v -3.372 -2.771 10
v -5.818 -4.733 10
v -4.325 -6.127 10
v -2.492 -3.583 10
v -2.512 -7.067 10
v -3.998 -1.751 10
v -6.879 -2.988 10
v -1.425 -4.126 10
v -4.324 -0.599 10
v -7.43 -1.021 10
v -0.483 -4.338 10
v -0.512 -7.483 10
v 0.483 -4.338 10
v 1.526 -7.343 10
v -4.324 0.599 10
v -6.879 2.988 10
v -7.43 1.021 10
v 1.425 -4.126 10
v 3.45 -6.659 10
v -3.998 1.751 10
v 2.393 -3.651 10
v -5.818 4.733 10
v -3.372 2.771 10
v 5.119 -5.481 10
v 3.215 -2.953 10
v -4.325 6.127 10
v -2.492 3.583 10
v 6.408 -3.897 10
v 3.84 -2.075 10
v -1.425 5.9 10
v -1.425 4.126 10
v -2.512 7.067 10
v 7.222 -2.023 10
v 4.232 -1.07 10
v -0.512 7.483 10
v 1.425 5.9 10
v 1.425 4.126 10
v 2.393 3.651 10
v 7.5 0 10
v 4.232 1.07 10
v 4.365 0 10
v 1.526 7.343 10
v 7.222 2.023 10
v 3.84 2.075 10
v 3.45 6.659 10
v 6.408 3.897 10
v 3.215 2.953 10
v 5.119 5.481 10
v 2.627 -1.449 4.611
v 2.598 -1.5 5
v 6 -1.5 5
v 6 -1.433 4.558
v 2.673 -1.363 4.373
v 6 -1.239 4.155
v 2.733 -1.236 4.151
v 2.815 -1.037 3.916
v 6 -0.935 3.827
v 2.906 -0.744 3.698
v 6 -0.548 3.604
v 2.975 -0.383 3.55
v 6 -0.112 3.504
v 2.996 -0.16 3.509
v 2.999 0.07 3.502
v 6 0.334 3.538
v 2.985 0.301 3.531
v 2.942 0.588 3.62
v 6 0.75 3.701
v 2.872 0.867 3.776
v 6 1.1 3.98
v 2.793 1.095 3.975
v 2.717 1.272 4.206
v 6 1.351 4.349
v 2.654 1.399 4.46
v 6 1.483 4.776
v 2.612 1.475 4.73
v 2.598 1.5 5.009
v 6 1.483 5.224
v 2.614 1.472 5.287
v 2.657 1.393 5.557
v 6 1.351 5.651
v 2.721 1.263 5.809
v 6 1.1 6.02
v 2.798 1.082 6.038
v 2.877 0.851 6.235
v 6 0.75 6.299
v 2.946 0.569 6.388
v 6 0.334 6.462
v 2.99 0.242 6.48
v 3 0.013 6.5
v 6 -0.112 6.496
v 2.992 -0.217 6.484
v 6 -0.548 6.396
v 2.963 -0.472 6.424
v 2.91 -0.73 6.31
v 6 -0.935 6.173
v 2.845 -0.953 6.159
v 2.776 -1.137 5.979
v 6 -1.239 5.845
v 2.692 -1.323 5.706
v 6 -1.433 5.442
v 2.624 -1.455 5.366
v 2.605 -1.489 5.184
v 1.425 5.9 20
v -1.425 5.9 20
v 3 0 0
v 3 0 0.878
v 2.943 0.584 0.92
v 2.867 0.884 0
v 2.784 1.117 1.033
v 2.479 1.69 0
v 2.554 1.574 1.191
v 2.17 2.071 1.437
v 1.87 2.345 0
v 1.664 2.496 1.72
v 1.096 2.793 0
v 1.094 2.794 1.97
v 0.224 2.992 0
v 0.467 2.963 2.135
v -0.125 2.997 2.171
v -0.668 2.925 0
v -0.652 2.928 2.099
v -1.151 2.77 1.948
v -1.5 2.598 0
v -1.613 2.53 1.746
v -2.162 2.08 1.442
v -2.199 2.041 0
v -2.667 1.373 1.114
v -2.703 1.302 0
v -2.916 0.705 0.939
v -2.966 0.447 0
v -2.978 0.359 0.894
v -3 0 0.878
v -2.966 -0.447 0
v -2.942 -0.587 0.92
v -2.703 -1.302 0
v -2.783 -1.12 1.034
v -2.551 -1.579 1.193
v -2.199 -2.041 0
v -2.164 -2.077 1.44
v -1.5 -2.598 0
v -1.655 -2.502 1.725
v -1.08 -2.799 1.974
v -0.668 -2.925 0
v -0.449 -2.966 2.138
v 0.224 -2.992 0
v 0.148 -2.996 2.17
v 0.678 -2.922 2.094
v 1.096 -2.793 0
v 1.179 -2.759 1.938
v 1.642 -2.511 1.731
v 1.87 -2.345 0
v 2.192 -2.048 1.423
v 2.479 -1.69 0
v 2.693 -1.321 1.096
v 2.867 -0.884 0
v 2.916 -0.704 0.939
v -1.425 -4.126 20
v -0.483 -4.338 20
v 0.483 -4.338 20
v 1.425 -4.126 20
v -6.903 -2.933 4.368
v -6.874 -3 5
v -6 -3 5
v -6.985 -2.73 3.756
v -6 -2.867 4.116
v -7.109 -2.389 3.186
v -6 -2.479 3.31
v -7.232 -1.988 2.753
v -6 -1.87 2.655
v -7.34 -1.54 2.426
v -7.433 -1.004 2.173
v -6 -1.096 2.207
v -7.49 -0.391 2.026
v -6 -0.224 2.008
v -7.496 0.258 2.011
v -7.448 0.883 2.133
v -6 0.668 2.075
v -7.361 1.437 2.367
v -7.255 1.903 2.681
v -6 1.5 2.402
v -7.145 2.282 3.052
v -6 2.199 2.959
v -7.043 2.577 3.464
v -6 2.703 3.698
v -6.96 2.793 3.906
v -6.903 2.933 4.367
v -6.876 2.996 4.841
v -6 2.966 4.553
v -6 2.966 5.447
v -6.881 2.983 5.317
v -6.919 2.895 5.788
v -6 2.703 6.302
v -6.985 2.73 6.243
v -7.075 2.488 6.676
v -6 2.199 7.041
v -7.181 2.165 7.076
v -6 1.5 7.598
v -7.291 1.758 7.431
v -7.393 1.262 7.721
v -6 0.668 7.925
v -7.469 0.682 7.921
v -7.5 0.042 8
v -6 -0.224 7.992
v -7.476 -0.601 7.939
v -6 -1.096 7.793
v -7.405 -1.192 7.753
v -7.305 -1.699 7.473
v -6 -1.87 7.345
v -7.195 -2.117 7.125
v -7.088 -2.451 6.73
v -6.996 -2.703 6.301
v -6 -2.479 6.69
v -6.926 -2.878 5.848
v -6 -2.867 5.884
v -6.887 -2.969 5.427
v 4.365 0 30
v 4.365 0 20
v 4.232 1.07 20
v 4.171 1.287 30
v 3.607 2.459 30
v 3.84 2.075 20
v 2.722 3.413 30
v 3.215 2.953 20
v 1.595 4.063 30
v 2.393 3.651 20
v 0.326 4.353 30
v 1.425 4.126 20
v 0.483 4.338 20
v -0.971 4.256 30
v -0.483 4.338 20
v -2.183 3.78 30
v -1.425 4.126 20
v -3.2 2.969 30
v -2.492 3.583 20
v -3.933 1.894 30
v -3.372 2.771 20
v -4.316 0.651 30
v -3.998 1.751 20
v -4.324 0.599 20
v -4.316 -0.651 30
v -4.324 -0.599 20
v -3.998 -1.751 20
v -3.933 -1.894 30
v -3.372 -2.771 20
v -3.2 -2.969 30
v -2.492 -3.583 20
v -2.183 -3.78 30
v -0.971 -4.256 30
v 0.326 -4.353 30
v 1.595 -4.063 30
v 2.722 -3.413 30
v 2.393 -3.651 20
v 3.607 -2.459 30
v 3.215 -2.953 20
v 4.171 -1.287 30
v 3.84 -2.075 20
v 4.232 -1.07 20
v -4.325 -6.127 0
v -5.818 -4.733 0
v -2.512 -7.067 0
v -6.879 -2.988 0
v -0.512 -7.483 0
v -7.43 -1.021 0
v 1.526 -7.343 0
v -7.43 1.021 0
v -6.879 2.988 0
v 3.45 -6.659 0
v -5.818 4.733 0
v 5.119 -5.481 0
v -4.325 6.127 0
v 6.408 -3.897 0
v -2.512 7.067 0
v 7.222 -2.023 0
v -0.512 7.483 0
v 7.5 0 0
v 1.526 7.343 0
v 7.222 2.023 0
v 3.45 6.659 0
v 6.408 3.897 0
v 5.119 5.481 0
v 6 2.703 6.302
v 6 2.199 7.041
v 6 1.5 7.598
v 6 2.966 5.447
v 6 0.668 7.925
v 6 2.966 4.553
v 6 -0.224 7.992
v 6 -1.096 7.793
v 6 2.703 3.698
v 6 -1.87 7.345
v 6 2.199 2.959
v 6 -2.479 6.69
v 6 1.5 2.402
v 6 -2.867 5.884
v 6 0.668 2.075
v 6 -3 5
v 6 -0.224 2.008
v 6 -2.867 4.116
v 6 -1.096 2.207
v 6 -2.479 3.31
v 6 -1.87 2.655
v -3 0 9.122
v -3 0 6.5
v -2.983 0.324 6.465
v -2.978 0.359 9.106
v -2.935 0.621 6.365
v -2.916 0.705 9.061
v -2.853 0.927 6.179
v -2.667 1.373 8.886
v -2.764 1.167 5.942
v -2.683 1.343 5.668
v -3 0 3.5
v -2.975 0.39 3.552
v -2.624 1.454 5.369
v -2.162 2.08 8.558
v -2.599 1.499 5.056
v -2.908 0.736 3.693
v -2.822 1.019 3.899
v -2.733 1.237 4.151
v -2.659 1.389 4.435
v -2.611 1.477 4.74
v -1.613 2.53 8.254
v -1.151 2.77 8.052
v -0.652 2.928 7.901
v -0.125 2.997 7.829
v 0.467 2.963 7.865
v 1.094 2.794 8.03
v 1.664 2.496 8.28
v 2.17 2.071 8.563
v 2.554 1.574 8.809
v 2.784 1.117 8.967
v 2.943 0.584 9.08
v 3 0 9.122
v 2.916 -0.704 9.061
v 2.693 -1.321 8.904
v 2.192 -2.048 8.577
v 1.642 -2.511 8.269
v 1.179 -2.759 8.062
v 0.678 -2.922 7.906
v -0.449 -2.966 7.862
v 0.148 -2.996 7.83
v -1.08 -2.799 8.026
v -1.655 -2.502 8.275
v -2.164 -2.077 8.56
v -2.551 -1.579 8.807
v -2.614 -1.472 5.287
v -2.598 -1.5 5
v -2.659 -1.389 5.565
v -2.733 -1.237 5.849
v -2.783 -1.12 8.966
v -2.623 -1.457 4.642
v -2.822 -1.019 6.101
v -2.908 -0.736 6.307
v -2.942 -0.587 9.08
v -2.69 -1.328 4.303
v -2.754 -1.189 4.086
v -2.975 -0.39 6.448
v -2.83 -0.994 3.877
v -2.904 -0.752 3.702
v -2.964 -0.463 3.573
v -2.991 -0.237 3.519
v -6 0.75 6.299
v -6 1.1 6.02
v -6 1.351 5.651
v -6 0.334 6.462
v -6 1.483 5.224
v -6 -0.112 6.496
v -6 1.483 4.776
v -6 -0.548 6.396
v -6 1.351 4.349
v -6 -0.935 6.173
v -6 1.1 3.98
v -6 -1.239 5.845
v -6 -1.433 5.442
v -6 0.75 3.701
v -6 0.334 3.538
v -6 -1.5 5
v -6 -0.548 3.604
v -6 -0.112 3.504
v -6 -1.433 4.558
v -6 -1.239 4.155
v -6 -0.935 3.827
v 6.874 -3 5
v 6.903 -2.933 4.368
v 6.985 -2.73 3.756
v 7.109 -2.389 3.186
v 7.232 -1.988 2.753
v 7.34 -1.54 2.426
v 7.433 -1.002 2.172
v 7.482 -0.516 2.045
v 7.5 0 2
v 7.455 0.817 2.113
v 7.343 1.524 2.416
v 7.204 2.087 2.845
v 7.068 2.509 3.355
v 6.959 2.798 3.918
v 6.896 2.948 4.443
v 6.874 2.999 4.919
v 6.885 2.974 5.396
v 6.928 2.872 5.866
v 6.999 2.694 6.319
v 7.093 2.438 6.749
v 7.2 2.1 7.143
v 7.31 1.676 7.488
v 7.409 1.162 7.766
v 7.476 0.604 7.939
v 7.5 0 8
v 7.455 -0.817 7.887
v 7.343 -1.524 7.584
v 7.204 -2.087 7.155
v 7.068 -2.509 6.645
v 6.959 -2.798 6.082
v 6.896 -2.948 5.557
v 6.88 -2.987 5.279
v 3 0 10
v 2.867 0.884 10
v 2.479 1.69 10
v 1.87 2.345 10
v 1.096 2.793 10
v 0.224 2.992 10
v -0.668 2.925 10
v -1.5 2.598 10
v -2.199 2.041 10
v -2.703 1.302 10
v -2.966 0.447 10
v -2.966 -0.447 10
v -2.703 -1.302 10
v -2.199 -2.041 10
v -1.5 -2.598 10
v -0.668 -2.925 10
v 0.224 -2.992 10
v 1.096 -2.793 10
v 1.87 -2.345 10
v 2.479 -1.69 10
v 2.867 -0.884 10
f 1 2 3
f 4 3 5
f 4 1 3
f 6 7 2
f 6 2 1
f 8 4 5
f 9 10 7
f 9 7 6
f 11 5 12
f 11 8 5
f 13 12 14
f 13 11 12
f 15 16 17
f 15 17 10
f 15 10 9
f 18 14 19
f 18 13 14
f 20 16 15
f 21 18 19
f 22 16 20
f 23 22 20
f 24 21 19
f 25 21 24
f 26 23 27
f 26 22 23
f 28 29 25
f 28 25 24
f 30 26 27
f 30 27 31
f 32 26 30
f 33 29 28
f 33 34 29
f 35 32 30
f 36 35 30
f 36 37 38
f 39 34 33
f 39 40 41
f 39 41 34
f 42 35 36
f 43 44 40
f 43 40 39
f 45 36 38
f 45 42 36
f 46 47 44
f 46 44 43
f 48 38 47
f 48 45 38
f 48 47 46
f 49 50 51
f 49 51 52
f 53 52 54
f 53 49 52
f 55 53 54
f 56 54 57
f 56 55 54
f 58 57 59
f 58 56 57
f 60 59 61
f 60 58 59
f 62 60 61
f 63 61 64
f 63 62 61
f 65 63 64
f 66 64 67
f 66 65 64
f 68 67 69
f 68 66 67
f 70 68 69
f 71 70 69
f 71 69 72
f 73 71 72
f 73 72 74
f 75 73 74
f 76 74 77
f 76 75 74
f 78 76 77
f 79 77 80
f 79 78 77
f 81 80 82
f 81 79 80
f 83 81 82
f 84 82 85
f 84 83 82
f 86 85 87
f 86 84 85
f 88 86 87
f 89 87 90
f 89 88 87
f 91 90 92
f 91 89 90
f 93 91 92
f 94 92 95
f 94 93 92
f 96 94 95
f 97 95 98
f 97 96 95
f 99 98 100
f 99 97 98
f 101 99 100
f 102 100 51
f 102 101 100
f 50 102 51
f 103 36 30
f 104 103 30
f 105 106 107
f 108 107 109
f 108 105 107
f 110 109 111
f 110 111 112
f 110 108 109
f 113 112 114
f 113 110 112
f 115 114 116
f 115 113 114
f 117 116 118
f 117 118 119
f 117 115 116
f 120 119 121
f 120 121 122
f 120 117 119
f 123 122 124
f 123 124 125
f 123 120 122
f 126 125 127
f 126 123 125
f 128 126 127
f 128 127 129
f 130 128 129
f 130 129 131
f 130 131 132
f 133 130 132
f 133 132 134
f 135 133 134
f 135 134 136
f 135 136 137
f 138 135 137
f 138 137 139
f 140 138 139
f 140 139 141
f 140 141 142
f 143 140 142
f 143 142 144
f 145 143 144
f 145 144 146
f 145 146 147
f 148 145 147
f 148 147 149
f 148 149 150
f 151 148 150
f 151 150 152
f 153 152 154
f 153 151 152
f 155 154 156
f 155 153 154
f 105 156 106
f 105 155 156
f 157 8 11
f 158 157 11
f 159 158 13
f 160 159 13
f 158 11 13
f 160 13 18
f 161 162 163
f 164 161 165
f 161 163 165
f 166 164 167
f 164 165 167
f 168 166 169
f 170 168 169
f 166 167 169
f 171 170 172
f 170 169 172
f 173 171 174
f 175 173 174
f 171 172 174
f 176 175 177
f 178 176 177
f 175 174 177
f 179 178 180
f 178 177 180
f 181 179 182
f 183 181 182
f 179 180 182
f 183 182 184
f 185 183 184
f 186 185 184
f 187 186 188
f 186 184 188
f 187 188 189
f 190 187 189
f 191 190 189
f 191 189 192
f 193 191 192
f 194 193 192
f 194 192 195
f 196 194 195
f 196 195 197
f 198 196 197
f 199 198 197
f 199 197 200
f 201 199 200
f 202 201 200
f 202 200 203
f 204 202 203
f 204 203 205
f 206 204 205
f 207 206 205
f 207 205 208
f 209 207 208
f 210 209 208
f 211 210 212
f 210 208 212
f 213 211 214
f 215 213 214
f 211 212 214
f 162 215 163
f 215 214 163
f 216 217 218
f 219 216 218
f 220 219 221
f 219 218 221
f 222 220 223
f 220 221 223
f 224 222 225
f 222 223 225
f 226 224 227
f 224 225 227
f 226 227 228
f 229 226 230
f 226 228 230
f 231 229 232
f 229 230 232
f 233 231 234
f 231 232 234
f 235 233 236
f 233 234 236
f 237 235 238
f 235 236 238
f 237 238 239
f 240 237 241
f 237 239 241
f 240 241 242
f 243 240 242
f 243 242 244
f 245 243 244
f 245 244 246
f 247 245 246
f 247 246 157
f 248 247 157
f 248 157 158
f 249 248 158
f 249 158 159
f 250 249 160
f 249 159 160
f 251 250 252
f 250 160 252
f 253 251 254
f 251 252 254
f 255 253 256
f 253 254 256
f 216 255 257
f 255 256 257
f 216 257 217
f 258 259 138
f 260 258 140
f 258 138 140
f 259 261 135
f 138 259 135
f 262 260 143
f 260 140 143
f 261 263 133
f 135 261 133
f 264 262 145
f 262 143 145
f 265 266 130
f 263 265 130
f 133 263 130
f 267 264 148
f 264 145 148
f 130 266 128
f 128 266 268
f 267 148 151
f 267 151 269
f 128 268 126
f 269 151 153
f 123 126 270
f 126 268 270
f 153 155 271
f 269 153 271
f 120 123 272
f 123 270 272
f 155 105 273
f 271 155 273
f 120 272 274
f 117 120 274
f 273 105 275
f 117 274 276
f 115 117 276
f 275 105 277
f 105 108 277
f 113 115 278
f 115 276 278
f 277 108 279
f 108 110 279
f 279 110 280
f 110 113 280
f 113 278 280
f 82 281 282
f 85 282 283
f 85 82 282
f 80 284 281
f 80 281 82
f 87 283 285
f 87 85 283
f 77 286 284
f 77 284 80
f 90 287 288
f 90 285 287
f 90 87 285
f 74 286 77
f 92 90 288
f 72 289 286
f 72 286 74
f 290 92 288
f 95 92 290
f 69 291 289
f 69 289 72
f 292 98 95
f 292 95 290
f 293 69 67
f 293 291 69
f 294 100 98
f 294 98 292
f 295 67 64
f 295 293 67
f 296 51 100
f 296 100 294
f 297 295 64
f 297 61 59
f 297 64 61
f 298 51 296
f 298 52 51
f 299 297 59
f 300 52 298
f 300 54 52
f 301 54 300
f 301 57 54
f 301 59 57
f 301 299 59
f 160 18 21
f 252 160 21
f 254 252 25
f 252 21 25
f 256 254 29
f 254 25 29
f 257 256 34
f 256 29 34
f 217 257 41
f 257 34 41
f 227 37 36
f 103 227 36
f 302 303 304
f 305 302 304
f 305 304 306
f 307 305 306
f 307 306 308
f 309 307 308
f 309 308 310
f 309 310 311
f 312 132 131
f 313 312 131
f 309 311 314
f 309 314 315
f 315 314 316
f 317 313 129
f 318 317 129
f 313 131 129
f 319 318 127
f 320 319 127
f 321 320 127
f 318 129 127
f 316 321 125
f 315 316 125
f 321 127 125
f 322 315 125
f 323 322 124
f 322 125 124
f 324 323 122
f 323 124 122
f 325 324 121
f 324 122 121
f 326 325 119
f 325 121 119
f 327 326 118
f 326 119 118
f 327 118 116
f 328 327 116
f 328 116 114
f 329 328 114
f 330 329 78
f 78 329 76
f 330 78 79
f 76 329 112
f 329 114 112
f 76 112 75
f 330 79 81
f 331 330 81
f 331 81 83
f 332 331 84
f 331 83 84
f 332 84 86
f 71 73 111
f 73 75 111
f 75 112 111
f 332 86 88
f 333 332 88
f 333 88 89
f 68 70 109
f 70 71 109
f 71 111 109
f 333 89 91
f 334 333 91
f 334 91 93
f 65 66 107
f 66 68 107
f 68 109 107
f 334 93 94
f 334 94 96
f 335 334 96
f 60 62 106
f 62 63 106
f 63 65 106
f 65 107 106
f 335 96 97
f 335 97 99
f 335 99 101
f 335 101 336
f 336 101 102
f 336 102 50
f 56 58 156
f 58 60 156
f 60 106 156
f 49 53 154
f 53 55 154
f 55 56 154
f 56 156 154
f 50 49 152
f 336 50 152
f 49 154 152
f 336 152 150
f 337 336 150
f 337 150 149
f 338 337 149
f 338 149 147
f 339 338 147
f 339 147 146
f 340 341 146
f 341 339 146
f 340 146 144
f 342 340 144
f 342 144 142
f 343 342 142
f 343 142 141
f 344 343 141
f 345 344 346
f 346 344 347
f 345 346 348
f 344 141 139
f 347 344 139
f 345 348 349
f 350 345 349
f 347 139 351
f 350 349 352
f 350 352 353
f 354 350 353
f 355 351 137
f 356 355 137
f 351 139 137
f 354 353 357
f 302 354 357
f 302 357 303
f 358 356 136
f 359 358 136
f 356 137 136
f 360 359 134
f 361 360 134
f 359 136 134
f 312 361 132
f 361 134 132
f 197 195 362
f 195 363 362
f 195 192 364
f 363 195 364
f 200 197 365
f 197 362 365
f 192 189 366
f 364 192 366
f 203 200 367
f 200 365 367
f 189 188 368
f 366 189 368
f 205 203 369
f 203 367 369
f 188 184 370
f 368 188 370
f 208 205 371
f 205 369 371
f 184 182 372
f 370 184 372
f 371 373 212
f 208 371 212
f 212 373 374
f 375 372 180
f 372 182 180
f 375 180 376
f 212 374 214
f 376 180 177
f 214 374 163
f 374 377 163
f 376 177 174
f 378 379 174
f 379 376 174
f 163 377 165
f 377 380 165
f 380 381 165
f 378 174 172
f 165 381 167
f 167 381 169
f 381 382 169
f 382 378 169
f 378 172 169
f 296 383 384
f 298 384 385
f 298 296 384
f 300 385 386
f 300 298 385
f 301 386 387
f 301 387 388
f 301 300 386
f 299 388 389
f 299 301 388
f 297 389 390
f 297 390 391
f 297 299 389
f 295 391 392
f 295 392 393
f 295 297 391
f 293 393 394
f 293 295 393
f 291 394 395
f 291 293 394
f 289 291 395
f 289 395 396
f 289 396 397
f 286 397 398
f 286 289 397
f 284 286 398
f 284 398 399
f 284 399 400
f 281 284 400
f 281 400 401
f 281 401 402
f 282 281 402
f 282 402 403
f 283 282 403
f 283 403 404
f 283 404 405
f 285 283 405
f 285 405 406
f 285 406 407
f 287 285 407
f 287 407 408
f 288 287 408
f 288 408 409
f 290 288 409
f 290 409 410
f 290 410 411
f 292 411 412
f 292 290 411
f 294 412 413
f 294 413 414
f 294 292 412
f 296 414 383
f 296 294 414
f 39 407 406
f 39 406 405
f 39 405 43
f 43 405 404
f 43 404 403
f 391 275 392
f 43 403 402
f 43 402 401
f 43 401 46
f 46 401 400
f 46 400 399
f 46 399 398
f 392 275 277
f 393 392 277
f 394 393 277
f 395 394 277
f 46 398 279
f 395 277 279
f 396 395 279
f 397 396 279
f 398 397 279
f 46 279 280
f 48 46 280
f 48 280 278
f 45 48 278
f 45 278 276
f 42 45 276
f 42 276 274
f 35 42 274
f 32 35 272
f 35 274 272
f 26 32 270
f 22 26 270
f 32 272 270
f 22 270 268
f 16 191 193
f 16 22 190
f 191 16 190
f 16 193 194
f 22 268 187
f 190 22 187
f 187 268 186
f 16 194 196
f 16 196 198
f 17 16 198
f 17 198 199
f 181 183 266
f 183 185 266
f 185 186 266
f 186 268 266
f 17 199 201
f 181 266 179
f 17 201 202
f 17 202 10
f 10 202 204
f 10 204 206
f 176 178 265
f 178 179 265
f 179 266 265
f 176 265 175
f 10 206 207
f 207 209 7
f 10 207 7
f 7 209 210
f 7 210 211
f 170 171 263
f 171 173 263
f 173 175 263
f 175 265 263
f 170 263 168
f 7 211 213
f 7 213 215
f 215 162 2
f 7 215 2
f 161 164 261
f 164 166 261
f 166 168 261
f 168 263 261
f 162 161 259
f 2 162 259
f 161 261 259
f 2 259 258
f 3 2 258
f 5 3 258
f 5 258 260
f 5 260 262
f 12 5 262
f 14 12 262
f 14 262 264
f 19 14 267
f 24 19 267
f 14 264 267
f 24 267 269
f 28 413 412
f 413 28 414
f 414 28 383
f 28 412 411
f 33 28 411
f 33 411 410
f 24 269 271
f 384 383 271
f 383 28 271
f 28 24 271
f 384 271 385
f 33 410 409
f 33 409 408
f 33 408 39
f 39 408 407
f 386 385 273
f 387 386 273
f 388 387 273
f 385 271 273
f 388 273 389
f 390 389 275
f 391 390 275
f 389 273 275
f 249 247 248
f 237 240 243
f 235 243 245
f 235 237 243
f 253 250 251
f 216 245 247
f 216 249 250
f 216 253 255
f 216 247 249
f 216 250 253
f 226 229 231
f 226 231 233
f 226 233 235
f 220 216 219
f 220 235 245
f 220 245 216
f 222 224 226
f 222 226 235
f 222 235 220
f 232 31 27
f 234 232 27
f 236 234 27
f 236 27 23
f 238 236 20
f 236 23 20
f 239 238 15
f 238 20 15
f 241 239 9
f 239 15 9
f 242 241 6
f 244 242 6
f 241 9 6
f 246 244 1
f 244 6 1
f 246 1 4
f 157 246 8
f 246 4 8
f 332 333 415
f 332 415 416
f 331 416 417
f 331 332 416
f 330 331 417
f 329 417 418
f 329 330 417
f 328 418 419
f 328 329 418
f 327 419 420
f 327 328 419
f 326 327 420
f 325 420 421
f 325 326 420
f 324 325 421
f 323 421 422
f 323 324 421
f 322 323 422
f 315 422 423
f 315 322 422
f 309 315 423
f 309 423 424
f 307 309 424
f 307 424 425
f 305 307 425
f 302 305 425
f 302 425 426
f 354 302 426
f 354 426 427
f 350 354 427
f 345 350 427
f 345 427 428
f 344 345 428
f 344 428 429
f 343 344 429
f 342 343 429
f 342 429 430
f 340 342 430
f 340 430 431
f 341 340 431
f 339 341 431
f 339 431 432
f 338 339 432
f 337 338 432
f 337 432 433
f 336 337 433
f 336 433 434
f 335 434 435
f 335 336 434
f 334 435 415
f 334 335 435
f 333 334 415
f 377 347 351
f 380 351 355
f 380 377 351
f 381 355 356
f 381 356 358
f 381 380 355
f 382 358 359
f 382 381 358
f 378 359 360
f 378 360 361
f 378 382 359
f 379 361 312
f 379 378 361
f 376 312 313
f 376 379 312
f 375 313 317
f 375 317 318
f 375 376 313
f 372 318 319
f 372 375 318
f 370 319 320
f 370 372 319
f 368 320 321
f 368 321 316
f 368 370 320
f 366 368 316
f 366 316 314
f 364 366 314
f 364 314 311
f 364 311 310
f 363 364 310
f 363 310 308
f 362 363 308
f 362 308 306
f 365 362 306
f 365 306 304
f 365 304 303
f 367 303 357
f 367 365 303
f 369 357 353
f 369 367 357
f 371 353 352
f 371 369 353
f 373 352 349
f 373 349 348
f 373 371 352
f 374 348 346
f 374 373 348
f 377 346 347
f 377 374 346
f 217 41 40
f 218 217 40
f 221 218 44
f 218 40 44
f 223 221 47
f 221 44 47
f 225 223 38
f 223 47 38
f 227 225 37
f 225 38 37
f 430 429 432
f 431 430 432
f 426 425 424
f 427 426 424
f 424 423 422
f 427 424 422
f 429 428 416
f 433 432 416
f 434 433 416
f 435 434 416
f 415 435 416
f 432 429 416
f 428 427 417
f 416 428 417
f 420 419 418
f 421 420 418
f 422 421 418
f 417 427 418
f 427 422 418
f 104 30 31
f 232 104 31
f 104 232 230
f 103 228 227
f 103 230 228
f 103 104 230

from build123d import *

# Parameters (mm, degrees)
SKETCH2_R               = 7.5
SKETCH2_R_2             = 3
BOSS_EXTRUDE1_DEPTH     = 10
SKETCH3_R               = 3
CUT_EXTRUDE1_DEPTH      = 8.5
CUT_EXTRUDE1_DEPTH_BACK = 8.5
SKETCH3_5_R             = 4.121610416
SKETCH3_5_R_2           = 1.5
BOSS_EXTRUDE6_DEPTH     = 6
BOSS_EXTRUDE7_DEPTH     = 10
SKETCH5_R               = 3
CUT_EXTRUDE3_DEPTH      = 10
SKETCH6_R               = 4.365
BOSS_EXTRUDE8_DEPTH     = 10


with BuildPart() as part:
    # Sketch2 → Boss-Extrude1 (new body)
    with BuildSketch(Plane.XY):
        Circle(SKETCH2_R)
        Circle(SKETCH2_R_2, mode=Mode.SUBTRACT)
    extrude(amount=BOSS_EXTRUDE1_DEPTH)

    # Sketch3 → Cut-Extrude1 (cut, two sides)
    with BuildSketch(Plane(origin=(0, 0, 0), x_dir=(0, -1, 0), z_dir=(1, 0, 0))) as cut_extrude1_sk:
        with Locations((0, -5)):
            Circle(SKETCH3_R)
    extrude(amount=CUT_EXTRUDE1_DEPTH, mode=Mode.SUBTRACT)
    extrude(cut_extrude1_sk.sketch, amount=-CUT_EXTRUDE1_DEPTH_BACK, mode=Mode.SUBTRACT)

    # Sketch3<5> → Boss-Extrude6 (add, symmetric)
    with BuildSketch(Plane(origin=(0, 0, 0), x_dir=(0, -1, 0), z_dir=(1, 0, 0))):
        with Locations((0, -5)):
            Circle(SKETCH3_5_R)
        with Locations((0, -5)):
            Circle(SKETCH3_5_R_2, mode=Mode.SUBTRACT)
    extrude(amount=BOSS_EXTRUDE6_DEPTH, both=True)

    # Sketch4 → Boss-Extrude7 (add)
    with BuildSketch(Plane.XY.offset(10)):
        with BuildLine():
            ThreePointArc((-1.425, 4.125845368), (-4.365, 0), (-1.425, -4.125845368))
            Line((-1.425, -4.125845368), (-1.425, -2.639957386))
            ThreePointArc((-1.425, -2.639957386), (-3, 0), (-1.425, 2.639957386))
            Line((-1.425, 2.639957386), (-1.425, 4.125845368))
        make_face()
        with BuildLine():
            Line((-1.425, -2.639957386), (-1.425, -4.125845368))
            ThreePointArc((-1.425, -4.125845368), (0, -4.365), (1.425, -4.125845368))
            Line((1.425, -4.125845368), (1.425, -2.639957386))
            ThreePointArc((1.425, -2.639957386), (0, -3), (-1.425, -2.639957386))
        make_face()
        with BuildLine():
            ThreePointArc((1.425, 4.125845368), (0, 4.365), (-1.425, 4.125845368))
            Line((-1.425, 4.125845368), (-1.425, 2.639957386))
            ThreePointArc((-1.425, 2.639957386), (0, 3), (1.425, 2.639957386))
            Line((1.425, 2.639957386), (1.425, 4.125845368))
        make_face()
        with BuildLine():
            Line((-1.425, 5.9), (-1.425, 4.125845368))
            ThreePointArc((-1.425, 4.125845368), (0, 4.365), (1.425, 4.125845368))
            Line((1.425, 4.125845368), (1.425, 5.9))
            Line((1.425, 5.9), (-1.425, 5.9))
        make_face()
        with BuildLine():
            Line((1.425, -2.639957386), (1.425, -4.125845368))
            ThreePointArc((1.425, -4.125845368), (3.554810122, -2.533090997), (4.365, 0))
            ThreePointArc((4.365, 0), (3.554810122, 2.533090997), (1.425, 4.125845368))
            Line((1.425, 4.125845368), (1.425, 2.639957386))
            ThreePointArc((1.425, 2.639957386), (2.576334606, 1.537042615), (3, 0))
            ThreePointArc((3, 0), (2.576334606, -1.537042615), (1.425, -2.639957386))
        make_face()
        with BuildLine():
            ThreePointArc((-1.425, 2.639957386), (-3, 0), (-1.425, -2.639957386))
            Line((-1.425, -2.639957386), (-1.425, 2.639957386))
        make_face()
        with BuildLine():
            Line((-1.425, 2.639957386), (-1.425, -2.639957386))
            ThreePointArc((-1.425, -2.639957386), (0, -3), (1.425, -2.639957386))
            Line((1.425, -2.639957386), (1.425, 2.639957386))
            ThreePointArc((1.425, 2.639957386), (0, 3), (-1.425, 2.639957386))
        make_face()
        with BuildLine():
            Line((1.425, 2.639957386), (1.425, -2.639957386))
            ThreePointArc((1.425, -2.639957386), (2.576334606, -1.537042615), (3, 0))
            ThreePointArc((3, 0), (2.576334606, 1.537042615), (1.425, 2.639957386))
        make_face()
    extrude(amount=BOSS_EXTRUDE7_DEPTH)

    # Sketch5 → Cut-Extrude3 (cut)
    with BuildSketch(Plane(origin=(0, 0, 0), x_dir=(-1, 0, 0), z_dir=(0, 0, -1))):
        Circle(SKETCH5_R)
    extrude(amount=-CUT_EXTRUDE3_DEPTH, mode=Mode.SUBTRACT)

    # Sketch6 → Boss-Extrude8 (add)
    with BuildSketch(Plane.XY.offset(20)):
        Circle(SKETCH6_R)
    extrude(amount=BOSS_EXTRUDE8_DEPTH)


solid = part.part
